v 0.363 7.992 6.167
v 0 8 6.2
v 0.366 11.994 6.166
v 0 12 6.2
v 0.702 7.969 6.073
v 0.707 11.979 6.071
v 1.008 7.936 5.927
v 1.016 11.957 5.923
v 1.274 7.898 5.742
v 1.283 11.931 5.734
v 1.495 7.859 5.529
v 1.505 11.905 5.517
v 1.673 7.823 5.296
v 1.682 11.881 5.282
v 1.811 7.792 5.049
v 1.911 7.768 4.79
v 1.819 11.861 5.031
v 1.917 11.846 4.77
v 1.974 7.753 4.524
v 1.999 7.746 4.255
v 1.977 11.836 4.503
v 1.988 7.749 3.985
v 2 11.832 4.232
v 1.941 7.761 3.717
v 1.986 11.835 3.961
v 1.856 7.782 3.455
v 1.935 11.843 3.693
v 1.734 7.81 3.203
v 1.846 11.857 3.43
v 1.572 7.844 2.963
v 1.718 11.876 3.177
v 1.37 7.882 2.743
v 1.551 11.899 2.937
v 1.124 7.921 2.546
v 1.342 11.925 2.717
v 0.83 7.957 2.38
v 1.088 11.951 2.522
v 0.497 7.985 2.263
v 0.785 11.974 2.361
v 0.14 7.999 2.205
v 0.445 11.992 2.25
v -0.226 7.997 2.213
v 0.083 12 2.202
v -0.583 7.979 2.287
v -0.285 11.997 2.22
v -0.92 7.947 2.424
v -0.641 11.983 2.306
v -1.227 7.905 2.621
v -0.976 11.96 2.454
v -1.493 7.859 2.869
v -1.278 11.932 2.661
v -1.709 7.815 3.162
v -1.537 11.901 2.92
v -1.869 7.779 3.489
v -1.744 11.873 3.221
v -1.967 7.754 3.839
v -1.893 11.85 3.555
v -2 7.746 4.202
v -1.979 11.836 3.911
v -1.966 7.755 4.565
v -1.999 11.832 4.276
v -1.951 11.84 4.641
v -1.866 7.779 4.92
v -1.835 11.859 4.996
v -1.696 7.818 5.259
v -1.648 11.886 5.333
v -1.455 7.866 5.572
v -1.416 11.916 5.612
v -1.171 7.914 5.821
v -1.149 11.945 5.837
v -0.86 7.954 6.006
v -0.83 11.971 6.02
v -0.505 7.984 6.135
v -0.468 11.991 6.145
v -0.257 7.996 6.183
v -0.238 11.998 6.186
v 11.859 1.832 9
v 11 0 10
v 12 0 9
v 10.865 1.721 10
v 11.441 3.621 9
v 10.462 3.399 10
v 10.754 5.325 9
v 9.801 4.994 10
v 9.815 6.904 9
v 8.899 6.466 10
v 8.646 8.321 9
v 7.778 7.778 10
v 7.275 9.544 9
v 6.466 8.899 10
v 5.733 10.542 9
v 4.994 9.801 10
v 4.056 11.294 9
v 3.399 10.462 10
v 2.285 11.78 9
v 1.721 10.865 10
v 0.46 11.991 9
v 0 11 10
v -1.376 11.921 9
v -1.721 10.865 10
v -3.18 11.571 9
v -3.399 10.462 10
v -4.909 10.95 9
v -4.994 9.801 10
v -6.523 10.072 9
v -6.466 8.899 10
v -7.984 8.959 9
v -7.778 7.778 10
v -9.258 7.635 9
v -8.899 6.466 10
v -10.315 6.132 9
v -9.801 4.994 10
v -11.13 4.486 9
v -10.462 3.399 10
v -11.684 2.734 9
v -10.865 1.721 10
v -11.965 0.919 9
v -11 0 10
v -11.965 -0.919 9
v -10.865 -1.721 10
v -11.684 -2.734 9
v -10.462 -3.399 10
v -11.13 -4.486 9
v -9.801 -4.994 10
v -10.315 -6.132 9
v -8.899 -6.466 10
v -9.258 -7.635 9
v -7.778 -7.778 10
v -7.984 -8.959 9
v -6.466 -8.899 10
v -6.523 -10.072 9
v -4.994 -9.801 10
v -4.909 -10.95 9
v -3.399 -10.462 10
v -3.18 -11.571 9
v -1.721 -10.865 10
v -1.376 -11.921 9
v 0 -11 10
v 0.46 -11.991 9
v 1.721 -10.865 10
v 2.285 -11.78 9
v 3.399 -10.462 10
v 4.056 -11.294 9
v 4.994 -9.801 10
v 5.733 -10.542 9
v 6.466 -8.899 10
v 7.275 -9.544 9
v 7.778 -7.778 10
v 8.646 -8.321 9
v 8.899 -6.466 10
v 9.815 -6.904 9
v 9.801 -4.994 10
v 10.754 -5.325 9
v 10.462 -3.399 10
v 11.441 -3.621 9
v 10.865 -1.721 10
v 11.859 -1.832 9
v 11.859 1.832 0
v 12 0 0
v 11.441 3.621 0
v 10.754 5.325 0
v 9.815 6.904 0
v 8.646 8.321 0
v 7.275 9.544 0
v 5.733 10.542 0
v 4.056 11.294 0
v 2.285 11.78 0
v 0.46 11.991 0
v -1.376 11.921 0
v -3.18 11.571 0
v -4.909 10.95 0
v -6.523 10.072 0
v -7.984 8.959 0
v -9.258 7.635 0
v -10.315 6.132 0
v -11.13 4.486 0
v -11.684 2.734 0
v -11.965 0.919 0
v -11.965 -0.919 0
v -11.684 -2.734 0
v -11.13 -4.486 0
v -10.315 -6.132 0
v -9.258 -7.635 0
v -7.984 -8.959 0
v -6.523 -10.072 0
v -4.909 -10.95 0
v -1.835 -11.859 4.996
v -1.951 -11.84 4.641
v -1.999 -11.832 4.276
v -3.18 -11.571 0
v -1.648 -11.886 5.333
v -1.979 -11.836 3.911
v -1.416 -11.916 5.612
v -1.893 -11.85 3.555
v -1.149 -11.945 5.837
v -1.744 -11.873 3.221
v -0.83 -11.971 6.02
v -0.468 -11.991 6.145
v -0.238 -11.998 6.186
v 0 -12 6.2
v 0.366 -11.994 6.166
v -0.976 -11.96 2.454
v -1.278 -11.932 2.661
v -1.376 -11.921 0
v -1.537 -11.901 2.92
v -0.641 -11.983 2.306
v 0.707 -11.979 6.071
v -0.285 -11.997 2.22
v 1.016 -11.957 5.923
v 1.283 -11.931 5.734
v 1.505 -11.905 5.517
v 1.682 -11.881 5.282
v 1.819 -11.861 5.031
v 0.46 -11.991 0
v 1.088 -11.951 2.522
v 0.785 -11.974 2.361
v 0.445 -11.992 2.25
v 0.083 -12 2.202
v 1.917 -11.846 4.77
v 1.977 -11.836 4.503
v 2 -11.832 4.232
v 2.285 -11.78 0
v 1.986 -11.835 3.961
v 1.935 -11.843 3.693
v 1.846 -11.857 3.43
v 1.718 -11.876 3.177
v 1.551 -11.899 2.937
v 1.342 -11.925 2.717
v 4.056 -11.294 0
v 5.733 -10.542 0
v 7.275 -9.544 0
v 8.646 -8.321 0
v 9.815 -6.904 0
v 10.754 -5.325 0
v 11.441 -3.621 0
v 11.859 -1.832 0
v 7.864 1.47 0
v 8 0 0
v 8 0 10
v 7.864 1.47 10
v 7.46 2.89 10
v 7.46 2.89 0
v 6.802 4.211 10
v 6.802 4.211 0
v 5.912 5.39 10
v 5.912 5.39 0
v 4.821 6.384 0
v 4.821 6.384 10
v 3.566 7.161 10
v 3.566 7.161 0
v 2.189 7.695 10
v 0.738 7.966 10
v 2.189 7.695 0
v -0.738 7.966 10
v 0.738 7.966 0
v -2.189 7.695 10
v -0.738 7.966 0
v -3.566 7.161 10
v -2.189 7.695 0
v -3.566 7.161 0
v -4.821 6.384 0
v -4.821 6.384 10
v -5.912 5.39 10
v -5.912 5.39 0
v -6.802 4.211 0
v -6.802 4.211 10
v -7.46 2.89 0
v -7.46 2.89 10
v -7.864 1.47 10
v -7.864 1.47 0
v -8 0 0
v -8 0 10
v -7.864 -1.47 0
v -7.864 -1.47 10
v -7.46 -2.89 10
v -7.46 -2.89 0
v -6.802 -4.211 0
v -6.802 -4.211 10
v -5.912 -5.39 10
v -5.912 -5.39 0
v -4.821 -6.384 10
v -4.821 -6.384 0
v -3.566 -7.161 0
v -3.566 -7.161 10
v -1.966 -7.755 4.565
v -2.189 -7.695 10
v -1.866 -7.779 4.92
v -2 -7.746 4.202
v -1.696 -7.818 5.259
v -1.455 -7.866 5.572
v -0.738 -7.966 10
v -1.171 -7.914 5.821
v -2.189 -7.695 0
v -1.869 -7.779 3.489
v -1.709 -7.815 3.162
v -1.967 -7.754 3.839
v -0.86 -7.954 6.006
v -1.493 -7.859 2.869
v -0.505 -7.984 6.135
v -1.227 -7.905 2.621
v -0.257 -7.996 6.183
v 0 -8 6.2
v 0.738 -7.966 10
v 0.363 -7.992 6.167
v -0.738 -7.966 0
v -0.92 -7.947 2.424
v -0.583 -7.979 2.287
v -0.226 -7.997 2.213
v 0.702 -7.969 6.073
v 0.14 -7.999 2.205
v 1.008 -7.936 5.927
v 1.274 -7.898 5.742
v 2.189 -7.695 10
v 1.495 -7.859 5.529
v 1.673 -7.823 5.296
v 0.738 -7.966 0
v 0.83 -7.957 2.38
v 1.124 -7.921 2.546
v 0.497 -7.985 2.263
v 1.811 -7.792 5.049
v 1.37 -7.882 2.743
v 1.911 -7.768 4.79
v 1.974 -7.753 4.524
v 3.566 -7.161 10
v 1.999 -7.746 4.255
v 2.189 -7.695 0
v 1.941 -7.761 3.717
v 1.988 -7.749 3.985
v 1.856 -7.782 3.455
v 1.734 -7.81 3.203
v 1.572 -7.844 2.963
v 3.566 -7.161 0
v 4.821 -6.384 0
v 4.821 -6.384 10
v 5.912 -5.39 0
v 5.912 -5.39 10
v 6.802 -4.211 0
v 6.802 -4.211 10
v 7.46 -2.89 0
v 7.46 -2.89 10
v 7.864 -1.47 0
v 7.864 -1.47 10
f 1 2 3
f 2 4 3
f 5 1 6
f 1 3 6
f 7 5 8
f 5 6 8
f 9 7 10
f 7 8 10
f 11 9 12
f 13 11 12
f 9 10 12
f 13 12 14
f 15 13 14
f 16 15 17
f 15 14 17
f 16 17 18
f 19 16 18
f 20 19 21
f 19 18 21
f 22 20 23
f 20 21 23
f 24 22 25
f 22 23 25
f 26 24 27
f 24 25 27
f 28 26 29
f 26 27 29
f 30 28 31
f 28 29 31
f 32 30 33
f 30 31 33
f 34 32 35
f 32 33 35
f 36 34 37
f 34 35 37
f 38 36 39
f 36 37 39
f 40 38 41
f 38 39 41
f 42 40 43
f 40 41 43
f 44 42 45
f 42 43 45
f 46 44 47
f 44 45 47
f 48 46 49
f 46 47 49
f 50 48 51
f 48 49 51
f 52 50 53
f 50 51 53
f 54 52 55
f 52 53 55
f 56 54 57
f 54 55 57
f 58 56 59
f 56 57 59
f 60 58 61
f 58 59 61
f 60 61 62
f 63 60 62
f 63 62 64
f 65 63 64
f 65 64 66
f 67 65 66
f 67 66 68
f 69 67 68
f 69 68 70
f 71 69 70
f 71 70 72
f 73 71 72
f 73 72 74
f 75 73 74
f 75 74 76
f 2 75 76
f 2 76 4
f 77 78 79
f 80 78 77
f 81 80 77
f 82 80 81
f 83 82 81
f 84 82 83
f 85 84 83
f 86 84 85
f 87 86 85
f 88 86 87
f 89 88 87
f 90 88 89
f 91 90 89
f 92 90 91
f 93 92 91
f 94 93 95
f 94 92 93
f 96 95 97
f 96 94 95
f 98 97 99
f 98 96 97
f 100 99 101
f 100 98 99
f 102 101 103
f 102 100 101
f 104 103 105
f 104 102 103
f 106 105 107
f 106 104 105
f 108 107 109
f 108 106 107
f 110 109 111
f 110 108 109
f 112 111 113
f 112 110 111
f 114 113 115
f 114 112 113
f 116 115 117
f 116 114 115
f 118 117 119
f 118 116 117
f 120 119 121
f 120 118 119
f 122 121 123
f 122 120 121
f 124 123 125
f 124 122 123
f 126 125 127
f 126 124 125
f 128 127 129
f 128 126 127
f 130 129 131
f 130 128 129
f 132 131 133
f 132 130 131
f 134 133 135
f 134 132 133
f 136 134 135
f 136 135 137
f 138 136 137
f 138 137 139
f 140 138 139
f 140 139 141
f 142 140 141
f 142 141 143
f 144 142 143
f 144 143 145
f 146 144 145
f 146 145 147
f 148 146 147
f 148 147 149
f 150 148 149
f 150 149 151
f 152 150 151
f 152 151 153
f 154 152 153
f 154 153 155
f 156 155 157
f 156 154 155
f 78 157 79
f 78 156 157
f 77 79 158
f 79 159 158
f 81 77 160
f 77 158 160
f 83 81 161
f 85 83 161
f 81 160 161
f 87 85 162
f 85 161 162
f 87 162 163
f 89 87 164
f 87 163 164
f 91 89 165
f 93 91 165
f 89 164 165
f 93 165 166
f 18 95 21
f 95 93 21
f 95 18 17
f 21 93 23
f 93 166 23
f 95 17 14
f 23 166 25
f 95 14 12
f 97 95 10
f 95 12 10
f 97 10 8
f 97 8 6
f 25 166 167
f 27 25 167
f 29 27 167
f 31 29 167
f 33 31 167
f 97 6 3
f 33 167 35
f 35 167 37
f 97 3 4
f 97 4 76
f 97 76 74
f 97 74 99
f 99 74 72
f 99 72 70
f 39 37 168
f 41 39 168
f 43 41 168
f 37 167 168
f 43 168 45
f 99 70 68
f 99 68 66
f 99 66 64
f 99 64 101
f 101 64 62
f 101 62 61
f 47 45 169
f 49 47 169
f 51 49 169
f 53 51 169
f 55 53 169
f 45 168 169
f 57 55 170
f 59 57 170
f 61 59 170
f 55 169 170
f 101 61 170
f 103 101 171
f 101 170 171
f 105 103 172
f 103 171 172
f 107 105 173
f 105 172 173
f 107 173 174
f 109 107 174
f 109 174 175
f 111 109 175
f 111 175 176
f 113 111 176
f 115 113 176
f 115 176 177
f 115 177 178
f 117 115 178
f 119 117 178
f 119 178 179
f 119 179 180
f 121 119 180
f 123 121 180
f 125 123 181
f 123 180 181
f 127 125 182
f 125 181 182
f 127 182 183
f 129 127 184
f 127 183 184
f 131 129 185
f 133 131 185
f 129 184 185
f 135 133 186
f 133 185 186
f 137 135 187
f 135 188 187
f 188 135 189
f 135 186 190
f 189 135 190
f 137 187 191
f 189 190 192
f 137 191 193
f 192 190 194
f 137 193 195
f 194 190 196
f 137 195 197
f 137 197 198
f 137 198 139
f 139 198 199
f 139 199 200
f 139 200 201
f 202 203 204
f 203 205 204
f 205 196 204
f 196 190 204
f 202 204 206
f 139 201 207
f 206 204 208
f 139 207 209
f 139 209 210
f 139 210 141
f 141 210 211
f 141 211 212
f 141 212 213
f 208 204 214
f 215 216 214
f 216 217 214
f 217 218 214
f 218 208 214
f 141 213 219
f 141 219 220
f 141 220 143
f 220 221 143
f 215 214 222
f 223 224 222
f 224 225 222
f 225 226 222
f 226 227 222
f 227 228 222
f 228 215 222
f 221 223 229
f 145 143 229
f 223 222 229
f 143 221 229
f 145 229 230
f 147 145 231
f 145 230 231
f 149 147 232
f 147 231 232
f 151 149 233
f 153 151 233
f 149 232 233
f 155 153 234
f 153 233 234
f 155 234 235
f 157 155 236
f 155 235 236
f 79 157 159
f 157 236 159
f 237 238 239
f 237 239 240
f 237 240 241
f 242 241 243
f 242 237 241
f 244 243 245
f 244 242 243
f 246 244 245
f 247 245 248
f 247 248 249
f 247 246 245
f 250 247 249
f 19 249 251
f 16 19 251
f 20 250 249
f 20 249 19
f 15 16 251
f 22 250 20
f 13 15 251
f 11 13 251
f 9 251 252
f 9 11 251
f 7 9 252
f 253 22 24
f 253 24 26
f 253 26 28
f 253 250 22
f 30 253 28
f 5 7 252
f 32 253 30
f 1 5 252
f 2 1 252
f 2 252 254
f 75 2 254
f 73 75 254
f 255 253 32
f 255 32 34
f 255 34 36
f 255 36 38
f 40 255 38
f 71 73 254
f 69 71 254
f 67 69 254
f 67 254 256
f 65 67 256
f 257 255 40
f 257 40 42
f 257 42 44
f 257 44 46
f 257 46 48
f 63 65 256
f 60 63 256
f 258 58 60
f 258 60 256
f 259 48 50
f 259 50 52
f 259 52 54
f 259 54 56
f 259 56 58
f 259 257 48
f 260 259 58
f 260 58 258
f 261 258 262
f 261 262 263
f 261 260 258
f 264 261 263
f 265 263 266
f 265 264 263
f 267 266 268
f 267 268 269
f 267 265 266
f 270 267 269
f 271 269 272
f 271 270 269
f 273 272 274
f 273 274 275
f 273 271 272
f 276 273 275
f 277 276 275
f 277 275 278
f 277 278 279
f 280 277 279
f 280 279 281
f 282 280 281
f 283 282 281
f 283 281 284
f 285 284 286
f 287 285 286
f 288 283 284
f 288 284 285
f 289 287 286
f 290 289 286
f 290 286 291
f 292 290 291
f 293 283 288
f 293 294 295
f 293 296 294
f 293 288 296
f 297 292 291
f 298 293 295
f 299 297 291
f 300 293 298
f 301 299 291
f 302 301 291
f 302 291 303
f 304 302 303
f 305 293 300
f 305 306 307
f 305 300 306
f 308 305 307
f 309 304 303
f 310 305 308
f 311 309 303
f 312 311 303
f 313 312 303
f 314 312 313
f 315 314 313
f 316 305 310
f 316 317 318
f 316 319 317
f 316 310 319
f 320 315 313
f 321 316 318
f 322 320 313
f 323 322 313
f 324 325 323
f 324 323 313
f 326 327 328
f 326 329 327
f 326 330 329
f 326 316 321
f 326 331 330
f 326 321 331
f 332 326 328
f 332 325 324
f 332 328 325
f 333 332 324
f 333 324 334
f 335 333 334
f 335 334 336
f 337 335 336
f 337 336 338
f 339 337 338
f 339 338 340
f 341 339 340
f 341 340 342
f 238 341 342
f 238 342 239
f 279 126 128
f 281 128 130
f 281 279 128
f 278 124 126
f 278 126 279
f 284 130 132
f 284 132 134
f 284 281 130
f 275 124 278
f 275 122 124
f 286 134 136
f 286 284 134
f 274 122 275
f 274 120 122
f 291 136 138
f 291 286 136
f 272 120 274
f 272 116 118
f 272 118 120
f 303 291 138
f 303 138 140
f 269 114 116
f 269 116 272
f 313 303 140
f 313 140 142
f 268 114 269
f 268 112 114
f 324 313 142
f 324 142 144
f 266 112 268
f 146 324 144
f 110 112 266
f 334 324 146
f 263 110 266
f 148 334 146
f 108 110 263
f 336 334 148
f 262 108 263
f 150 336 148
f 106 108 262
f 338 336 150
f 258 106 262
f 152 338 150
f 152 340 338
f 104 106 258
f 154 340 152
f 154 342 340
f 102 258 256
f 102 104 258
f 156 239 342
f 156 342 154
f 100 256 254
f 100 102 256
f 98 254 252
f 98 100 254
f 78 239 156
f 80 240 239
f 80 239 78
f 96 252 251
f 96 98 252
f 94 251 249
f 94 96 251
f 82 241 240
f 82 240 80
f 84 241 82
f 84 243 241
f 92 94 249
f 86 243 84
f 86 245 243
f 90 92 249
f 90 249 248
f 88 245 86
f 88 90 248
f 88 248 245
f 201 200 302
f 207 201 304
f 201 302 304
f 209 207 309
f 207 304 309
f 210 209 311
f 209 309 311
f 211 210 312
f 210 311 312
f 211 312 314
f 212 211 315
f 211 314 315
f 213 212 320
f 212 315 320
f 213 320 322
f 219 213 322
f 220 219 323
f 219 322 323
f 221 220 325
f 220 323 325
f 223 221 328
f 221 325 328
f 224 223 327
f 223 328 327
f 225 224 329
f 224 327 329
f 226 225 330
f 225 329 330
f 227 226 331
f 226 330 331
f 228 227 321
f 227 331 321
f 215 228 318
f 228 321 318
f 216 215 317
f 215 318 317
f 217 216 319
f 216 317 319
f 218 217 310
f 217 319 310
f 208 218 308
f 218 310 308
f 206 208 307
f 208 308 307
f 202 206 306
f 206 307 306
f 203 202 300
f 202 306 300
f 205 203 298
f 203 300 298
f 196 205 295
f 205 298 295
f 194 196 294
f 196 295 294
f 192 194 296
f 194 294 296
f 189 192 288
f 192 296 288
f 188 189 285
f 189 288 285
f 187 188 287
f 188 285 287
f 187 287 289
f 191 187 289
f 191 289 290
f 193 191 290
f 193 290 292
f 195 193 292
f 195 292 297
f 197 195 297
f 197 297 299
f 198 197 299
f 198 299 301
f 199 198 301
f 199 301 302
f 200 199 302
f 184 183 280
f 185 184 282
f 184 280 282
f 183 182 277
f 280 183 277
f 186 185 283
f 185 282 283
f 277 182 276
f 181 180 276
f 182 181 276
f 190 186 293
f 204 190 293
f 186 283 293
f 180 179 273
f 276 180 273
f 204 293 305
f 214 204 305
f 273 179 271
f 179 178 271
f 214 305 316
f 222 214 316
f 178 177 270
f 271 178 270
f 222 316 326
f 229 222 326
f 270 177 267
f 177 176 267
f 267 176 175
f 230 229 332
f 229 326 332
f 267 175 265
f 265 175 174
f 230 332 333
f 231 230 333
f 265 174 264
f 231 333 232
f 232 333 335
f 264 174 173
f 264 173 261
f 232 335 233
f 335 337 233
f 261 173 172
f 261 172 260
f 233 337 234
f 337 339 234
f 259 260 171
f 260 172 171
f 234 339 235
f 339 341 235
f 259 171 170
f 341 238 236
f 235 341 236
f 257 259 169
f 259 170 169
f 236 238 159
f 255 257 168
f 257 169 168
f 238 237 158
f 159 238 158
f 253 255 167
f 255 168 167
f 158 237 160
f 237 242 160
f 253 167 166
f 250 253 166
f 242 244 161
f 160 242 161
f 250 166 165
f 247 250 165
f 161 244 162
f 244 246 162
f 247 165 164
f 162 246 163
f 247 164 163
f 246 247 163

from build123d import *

# Parameters (mm, degrees)
SKETCH1_R           = 12
SKETCH1_R_2         = 8
BOSS_EXTRUDE1_DEPTH = 10
CHAMFER1_SIZE       = 1
SKETCH2_R           = 2
CUT_EXTRUDE1_DEPTH  = 27


with BuildPart() as part:
    # Sketch1 → Boss-Extrude1 (new body)
    with BuildSketch(Plane.XY):
        Circle(SKETCH1_R)
        Circle(SKETCH1_R_2, mode=Mode.SUBTRACT)
    extrude(amount=BOSS_EXTRUDE1_DEPTH)

    # Chamfer1
    chamfer1_edges = [part.edges().sort_by_distance(p)[0] for p in [
        (-12, 0, 10),
    ]]
    chamfer(chamfer1_edges, length=CHAMFER1_SIZE)

    # Sketch2 → Cut-Extrude1 (cut, symmetric)
    with BuildSketch(Plane(origin=(0, 0, 0), x_dir=(1, 0, 0), z_dir=(0, 1, 0))):
        with Locations(Location((0, -4.2, 0), (0, 0, 270))):
            Circle(SKETCH2_R)
    extrude(amount=CUT_EXTRUDE1_DEPTH, both=True, mode=Mode.SUBTRACT)


solid = part.part
